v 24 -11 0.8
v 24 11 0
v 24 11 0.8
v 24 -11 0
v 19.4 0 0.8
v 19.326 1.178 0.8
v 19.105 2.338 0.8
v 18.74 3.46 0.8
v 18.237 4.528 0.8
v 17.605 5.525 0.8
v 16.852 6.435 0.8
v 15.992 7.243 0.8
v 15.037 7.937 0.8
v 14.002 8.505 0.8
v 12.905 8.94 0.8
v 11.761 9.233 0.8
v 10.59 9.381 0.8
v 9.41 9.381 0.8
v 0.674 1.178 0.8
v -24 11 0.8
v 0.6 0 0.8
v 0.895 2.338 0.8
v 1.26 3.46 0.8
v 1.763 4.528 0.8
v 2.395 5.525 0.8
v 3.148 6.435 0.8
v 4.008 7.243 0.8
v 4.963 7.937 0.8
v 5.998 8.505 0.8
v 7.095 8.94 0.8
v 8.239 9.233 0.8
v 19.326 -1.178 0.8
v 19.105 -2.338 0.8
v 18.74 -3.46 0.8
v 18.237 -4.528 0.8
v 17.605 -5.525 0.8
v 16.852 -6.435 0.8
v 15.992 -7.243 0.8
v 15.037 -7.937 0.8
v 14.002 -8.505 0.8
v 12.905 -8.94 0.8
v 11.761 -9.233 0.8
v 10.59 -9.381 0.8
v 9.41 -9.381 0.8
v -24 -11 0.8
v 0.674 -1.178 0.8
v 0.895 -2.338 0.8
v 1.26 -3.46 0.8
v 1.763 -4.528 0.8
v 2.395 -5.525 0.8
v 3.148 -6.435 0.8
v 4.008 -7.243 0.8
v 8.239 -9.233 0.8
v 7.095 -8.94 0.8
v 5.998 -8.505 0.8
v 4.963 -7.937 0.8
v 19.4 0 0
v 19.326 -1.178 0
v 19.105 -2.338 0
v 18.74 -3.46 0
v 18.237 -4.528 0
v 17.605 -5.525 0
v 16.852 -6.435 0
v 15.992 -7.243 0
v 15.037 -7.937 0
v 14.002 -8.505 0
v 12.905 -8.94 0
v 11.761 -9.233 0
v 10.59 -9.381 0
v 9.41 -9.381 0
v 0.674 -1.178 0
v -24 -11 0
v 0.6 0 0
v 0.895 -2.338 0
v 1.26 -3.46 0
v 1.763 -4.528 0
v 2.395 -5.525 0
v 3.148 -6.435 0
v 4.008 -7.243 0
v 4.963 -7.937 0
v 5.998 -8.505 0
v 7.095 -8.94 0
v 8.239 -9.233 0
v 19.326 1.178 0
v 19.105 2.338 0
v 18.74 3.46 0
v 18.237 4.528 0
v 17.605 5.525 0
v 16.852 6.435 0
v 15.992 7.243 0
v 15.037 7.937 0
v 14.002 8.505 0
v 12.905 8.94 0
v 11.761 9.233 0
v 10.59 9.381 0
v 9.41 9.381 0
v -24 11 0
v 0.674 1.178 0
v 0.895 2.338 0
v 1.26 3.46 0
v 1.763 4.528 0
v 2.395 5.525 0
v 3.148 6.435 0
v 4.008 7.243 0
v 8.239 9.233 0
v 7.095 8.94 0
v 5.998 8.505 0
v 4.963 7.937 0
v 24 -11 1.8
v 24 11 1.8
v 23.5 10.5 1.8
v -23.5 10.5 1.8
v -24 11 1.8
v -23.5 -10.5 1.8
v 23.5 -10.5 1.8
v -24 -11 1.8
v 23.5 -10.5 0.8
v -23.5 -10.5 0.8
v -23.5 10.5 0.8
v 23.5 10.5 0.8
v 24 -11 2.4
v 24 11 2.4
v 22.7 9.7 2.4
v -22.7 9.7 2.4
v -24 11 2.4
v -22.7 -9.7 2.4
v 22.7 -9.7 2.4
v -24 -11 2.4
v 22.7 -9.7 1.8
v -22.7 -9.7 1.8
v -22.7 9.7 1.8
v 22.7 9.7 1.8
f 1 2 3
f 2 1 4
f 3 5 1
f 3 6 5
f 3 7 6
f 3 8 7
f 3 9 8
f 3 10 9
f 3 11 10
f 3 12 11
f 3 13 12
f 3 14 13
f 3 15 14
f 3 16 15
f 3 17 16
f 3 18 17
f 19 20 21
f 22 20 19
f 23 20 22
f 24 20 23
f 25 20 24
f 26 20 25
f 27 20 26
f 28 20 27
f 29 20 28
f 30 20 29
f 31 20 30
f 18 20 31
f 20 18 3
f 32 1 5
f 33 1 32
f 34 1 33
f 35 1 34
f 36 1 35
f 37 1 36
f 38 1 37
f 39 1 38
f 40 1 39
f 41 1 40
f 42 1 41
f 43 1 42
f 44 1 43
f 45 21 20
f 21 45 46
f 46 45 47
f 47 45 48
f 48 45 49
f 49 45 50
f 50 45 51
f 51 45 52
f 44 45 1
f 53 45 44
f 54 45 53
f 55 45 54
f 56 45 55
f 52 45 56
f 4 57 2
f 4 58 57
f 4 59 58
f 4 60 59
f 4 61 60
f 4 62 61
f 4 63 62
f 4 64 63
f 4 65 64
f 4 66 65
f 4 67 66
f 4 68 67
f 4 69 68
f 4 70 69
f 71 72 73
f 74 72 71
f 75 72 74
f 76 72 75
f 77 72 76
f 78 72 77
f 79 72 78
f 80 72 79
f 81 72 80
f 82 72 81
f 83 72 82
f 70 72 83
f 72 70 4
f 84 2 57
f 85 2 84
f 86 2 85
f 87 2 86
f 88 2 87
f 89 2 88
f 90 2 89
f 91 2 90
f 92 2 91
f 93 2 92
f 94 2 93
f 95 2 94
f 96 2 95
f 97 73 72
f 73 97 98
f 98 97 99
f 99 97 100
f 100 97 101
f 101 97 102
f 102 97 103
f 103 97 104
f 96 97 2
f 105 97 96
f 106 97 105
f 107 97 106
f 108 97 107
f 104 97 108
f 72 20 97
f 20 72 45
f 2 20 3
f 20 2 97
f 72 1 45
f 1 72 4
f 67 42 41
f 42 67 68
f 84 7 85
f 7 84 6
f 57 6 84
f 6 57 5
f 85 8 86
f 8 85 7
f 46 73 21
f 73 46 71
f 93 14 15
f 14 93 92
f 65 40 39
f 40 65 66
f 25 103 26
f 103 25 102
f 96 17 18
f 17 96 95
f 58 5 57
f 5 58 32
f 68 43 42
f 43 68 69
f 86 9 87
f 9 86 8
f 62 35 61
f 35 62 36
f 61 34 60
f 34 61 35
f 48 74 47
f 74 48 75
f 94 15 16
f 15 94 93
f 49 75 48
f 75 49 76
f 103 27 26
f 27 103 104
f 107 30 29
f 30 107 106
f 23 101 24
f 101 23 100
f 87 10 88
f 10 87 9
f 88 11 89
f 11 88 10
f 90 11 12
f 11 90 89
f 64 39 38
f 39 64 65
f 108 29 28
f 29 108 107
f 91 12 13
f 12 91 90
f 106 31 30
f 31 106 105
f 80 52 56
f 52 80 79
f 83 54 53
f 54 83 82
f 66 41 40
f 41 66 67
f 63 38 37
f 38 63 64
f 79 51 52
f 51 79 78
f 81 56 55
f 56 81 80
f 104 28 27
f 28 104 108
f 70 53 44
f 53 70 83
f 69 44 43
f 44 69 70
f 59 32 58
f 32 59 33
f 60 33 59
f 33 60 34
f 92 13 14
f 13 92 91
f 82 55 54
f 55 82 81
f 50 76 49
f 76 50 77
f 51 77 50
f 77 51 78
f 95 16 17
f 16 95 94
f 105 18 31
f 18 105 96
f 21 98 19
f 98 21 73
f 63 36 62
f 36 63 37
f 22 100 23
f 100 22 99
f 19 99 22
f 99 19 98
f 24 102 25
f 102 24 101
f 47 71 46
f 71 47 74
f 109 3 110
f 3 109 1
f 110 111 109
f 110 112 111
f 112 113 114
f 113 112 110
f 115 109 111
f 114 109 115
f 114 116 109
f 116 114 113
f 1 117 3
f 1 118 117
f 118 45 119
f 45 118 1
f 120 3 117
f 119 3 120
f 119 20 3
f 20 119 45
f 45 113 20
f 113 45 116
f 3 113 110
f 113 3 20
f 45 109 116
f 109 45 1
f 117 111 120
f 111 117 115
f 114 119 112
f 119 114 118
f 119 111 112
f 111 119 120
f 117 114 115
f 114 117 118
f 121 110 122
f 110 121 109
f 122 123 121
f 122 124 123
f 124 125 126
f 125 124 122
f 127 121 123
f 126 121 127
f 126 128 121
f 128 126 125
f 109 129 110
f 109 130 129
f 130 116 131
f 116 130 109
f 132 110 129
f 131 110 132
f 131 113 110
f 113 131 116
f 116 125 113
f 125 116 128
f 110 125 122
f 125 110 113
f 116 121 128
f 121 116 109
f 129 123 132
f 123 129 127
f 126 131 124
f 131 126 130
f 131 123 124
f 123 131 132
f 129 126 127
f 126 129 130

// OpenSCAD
overlap=0.004;
$fn=50;

baseX=48;
baseY=22;
baseZ=0.8;
baseZtop=baseZ;
baseZdelta=baseZ/2;


holeDeltaX=10;
holeDiameter=18.8;
holeHeight=10;

wallX=baseX;
wallY=baseY;
wallZ=1.0;
wallZtop=baseZtop+wallZ;
wallZdelta=baseZtop+wallZ/2;
wallThickness=1;

coverX=baseX;
coverY=baseY;
coverZ=0.6;
coverZtop=wallZtop+coverZ;
coverZdelta=wallZtop+coverZ/2;
coverDelta=2.6;


lensCover();


module lensCover(){
    base();
    wall();
    cover();
}

module base(){
    color("#555555")
    translate([0,0,baseZdelta])
    difference()
    {
        cube([baseX,baseY,baseZ],center=true);
        translate([holeDeltaX,0,0])
        cylinder(h=holeHeight,d=holeDiameter,center=true);
    }
}
    
module wall(){
    color("#dd9900")
    translate([0,0,wallZdelta])
    difference()
    {
        cube([wallX,wallY,wallZ],center=true);
        cube([wallX-wallThickness,wallY-wallThickness,wallZ+overlap*2+10],center=true);
    }
}

module cover(){
    color("#dddddd")
    translate([0,0,coverZdelta])
    difference()
    {
        cube([coverX,coverY,coverZ],center=true);
        cube([coverX-coverDelta,coverY-coverDelta,coverZ+overlap*2],center=true);
    }
}
